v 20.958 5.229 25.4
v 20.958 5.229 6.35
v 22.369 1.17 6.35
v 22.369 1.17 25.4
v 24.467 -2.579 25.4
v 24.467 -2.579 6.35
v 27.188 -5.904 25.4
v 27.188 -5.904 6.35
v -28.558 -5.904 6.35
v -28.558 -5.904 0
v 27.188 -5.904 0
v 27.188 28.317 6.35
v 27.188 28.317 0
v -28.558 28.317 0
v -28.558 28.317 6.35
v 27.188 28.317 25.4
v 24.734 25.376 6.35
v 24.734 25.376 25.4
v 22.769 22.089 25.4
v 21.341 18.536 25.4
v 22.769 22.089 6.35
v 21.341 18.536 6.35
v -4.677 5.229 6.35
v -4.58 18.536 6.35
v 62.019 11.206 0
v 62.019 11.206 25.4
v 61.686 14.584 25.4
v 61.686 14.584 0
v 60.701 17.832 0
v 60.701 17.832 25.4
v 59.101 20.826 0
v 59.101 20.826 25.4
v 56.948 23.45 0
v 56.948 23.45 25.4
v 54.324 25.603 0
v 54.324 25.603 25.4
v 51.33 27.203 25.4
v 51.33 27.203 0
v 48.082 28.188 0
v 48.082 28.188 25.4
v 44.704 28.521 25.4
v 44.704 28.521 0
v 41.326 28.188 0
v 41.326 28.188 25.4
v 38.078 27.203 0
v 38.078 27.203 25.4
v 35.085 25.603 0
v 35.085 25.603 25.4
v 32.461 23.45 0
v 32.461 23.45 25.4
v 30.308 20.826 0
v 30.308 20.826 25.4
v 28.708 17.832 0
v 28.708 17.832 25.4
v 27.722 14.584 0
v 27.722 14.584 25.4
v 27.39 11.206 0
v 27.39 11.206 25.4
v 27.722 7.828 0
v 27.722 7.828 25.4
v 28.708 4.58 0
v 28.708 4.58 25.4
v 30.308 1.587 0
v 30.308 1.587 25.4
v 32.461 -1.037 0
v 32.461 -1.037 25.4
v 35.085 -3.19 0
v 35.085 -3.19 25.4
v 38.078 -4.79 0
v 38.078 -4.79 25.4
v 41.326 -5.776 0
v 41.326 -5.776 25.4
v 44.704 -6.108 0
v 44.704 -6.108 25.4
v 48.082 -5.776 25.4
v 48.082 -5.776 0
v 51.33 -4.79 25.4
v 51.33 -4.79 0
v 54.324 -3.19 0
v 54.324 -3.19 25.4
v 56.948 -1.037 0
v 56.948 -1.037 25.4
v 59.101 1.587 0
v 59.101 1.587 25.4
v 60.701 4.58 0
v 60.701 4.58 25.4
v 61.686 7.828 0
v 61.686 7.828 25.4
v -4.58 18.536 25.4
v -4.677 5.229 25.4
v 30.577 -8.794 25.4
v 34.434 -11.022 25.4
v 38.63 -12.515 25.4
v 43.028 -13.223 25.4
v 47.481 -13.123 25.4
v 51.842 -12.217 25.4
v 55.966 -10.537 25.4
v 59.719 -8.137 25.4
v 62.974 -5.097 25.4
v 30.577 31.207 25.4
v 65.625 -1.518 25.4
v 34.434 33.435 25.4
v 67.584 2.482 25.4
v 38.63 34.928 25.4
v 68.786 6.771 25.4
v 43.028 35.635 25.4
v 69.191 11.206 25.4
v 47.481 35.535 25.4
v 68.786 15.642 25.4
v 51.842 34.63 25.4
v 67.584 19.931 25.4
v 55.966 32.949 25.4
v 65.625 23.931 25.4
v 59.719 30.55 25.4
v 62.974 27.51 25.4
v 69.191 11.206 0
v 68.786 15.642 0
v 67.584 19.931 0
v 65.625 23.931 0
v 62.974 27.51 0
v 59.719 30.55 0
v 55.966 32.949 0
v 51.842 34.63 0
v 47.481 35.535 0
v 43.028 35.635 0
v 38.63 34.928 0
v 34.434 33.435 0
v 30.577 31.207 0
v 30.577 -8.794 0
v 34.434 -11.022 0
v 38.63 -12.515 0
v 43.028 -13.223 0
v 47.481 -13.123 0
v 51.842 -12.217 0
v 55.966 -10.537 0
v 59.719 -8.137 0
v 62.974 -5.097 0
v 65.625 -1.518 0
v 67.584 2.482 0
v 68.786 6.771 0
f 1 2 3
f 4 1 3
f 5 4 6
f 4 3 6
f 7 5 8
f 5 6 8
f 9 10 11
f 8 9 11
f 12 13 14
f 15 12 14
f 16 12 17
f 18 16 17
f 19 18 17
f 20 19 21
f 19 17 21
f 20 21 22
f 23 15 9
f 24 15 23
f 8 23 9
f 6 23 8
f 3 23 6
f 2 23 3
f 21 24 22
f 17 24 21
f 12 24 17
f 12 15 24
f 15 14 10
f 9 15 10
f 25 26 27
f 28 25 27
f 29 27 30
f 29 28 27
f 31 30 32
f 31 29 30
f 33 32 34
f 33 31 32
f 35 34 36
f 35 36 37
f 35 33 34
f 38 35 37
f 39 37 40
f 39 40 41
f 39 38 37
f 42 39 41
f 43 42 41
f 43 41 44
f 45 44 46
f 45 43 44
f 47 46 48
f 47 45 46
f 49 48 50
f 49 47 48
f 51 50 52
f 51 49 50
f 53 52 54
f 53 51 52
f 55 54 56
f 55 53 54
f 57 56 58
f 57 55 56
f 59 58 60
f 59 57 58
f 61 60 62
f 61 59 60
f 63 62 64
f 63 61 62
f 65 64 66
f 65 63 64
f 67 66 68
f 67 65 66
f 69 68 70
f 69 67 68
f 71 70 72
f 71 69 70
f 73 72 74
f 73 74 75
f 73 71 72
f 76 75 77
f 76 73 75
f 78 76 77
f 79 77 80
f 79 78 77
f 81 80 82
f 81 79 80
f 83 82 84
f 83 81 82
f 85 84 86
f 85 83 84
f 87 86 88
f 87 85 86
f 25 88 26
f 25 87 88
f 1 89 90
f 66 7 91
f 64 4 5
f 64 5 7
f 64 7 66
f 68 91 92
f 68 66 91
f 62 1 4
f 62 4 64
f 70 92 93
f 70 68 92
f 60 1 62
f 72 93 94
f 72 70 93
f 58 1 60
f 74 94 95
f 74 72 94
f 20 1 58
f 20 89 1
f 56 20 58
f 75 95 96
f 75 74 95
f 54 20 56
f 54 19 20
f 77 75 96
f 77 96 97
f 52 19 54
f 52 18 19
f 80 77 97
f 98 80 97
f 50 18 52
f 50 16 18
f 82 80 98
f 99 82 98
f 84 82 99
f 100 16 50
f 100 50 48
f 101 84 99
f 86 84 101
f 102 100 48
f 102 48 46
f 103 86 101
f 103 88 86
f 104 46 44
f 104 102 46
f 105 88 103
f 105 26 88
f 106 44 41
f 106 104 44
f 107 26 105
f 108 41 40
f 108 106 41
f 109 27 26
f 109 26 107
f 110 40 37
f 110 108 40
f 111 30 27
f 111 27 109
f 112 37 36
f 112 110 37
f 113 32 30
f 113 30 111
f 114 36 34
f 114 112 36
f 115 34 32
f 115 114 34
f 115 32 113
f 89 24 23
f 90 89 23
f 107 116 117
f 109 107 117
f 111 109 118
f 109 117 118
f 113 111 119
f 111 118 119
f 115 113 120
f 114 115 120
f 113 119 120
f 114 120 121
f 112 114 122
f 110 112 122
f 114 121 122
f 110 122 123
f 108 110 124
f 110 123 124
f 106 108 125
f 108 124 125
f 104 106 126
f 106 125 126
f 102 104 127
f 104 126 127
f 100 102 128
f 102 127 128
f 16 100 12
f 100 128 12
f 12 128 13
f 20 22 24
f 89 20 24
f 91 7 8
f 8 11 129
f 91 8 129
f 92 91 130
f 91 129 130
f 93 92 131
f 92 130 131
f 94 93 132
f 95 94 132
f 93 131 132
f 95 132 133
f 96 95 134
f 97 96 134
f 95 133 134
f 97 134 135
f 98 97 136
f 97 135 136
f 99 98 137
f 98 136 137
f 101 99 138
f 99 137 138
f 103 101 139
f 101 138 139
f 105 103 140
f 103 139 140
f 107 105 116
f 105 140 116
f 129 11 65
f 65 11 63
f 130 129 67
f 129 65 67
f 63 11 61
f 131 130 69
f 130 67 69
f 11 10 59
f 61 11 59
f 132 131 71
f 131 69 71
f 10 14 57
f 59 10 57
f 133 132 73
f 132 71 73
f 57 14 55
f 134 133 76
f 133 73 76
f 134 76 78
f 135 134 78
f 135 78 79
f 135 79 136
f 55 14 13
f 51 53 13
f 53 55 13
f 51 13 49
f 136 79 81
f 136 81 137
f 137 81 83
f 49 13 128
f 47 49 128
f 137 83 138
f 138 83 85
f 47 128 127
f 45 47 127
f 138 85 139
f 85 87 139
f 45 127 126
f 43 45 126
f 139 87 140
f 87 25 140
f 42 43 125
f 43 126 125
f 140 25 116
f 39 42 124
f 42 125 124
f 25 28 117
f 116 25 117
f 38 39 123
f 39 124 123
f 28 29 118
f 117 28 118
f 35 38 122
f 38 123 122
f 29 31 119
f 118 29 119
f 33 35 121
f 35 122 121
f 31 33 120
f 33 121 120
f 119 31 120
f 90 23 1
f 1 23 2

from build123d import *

# Parameters (mm, degrees)
F1_DEPTH = 6.35
F0_R     = 17.314711
F2_DEPTH = 25.4
F3_DEPTH = 25.4


with BuildPart() as f1:
    # F0 (on Top) → F1 (new body)
    with BuildSketch(Plane.XY):
        with BuildLine():
            Line((-28.557787, 28.316794), (-28.557787, -5.904352))
            Line((-28.557787, -5.904352), (27.187924, -5.904352))
            ThreePointArc((27.187924, -5.904352), (23.335338, -0.750448), (20.958387, 5.229121))
            Line((20.958387, 5.229121), (-4.677194, 5.229121))
            Line((-4.677194, 5.229121), (-4.579983, 18.536286))
            Line((-4.579983, 18.536286), (21.340561, 18.536286))
            ThreePointArc((21.340561, 18.536286), (23.687391, 23.771415), (27.187924, 28.316794))
            Line((27.187924, 28.316794), (-28.557787, 28.316794))
        make_face()
    extrude(amount=F1_DEPTH)

    # F0 (on Top) → F2 (join)
    with BuildSketch(Plane.XY):
        with BuildLine():
            ThreePointArc((20.958387, 5.229121), (23.335338, -0.750448), (27.187924, -5.904352))
            ThreePointArc((27.187924, -5.904352), (53.942294, -11.471062), (69.191078, 11.206221))
            ThreePointArc((69.191078, 11.206221), (53.942294, 33.883504), (27.187924, 28.316794))
            ThreePointArc((27.187924, 28.316794), (23.687391, 23.771415), (21.340561, 18.536286))
            ThreePointArc((21.340561, 18.536286), (20.227784, 11.909174), (20.958387, 5.229121))
        make_face()
        with Locations((44.704385, 11.206221)):
            Circle(F0_R, mode=Mode.SUBTRACT)
    extrude(amount=F2_DEPTH)

    # F0 (on Top) → F3 (join)
    with BuildSketch(Plane.XY):
        with BuildLine():
            Line((-4.677194, 5.229121), (20.958387, 5.229121))
            ThreePointArc((20.958387, 5.229121), (20.227784, 11.909174), (21.340561, 18.536286))
            Line((21.340561, 18.536286), (-4.579983, 18.536286))
            Line((-4.579983, 18.536286), (-4.677194, 5.229121))
        make_face()
    extrude(amount=F3_DEPTH)


solid = f1.part
